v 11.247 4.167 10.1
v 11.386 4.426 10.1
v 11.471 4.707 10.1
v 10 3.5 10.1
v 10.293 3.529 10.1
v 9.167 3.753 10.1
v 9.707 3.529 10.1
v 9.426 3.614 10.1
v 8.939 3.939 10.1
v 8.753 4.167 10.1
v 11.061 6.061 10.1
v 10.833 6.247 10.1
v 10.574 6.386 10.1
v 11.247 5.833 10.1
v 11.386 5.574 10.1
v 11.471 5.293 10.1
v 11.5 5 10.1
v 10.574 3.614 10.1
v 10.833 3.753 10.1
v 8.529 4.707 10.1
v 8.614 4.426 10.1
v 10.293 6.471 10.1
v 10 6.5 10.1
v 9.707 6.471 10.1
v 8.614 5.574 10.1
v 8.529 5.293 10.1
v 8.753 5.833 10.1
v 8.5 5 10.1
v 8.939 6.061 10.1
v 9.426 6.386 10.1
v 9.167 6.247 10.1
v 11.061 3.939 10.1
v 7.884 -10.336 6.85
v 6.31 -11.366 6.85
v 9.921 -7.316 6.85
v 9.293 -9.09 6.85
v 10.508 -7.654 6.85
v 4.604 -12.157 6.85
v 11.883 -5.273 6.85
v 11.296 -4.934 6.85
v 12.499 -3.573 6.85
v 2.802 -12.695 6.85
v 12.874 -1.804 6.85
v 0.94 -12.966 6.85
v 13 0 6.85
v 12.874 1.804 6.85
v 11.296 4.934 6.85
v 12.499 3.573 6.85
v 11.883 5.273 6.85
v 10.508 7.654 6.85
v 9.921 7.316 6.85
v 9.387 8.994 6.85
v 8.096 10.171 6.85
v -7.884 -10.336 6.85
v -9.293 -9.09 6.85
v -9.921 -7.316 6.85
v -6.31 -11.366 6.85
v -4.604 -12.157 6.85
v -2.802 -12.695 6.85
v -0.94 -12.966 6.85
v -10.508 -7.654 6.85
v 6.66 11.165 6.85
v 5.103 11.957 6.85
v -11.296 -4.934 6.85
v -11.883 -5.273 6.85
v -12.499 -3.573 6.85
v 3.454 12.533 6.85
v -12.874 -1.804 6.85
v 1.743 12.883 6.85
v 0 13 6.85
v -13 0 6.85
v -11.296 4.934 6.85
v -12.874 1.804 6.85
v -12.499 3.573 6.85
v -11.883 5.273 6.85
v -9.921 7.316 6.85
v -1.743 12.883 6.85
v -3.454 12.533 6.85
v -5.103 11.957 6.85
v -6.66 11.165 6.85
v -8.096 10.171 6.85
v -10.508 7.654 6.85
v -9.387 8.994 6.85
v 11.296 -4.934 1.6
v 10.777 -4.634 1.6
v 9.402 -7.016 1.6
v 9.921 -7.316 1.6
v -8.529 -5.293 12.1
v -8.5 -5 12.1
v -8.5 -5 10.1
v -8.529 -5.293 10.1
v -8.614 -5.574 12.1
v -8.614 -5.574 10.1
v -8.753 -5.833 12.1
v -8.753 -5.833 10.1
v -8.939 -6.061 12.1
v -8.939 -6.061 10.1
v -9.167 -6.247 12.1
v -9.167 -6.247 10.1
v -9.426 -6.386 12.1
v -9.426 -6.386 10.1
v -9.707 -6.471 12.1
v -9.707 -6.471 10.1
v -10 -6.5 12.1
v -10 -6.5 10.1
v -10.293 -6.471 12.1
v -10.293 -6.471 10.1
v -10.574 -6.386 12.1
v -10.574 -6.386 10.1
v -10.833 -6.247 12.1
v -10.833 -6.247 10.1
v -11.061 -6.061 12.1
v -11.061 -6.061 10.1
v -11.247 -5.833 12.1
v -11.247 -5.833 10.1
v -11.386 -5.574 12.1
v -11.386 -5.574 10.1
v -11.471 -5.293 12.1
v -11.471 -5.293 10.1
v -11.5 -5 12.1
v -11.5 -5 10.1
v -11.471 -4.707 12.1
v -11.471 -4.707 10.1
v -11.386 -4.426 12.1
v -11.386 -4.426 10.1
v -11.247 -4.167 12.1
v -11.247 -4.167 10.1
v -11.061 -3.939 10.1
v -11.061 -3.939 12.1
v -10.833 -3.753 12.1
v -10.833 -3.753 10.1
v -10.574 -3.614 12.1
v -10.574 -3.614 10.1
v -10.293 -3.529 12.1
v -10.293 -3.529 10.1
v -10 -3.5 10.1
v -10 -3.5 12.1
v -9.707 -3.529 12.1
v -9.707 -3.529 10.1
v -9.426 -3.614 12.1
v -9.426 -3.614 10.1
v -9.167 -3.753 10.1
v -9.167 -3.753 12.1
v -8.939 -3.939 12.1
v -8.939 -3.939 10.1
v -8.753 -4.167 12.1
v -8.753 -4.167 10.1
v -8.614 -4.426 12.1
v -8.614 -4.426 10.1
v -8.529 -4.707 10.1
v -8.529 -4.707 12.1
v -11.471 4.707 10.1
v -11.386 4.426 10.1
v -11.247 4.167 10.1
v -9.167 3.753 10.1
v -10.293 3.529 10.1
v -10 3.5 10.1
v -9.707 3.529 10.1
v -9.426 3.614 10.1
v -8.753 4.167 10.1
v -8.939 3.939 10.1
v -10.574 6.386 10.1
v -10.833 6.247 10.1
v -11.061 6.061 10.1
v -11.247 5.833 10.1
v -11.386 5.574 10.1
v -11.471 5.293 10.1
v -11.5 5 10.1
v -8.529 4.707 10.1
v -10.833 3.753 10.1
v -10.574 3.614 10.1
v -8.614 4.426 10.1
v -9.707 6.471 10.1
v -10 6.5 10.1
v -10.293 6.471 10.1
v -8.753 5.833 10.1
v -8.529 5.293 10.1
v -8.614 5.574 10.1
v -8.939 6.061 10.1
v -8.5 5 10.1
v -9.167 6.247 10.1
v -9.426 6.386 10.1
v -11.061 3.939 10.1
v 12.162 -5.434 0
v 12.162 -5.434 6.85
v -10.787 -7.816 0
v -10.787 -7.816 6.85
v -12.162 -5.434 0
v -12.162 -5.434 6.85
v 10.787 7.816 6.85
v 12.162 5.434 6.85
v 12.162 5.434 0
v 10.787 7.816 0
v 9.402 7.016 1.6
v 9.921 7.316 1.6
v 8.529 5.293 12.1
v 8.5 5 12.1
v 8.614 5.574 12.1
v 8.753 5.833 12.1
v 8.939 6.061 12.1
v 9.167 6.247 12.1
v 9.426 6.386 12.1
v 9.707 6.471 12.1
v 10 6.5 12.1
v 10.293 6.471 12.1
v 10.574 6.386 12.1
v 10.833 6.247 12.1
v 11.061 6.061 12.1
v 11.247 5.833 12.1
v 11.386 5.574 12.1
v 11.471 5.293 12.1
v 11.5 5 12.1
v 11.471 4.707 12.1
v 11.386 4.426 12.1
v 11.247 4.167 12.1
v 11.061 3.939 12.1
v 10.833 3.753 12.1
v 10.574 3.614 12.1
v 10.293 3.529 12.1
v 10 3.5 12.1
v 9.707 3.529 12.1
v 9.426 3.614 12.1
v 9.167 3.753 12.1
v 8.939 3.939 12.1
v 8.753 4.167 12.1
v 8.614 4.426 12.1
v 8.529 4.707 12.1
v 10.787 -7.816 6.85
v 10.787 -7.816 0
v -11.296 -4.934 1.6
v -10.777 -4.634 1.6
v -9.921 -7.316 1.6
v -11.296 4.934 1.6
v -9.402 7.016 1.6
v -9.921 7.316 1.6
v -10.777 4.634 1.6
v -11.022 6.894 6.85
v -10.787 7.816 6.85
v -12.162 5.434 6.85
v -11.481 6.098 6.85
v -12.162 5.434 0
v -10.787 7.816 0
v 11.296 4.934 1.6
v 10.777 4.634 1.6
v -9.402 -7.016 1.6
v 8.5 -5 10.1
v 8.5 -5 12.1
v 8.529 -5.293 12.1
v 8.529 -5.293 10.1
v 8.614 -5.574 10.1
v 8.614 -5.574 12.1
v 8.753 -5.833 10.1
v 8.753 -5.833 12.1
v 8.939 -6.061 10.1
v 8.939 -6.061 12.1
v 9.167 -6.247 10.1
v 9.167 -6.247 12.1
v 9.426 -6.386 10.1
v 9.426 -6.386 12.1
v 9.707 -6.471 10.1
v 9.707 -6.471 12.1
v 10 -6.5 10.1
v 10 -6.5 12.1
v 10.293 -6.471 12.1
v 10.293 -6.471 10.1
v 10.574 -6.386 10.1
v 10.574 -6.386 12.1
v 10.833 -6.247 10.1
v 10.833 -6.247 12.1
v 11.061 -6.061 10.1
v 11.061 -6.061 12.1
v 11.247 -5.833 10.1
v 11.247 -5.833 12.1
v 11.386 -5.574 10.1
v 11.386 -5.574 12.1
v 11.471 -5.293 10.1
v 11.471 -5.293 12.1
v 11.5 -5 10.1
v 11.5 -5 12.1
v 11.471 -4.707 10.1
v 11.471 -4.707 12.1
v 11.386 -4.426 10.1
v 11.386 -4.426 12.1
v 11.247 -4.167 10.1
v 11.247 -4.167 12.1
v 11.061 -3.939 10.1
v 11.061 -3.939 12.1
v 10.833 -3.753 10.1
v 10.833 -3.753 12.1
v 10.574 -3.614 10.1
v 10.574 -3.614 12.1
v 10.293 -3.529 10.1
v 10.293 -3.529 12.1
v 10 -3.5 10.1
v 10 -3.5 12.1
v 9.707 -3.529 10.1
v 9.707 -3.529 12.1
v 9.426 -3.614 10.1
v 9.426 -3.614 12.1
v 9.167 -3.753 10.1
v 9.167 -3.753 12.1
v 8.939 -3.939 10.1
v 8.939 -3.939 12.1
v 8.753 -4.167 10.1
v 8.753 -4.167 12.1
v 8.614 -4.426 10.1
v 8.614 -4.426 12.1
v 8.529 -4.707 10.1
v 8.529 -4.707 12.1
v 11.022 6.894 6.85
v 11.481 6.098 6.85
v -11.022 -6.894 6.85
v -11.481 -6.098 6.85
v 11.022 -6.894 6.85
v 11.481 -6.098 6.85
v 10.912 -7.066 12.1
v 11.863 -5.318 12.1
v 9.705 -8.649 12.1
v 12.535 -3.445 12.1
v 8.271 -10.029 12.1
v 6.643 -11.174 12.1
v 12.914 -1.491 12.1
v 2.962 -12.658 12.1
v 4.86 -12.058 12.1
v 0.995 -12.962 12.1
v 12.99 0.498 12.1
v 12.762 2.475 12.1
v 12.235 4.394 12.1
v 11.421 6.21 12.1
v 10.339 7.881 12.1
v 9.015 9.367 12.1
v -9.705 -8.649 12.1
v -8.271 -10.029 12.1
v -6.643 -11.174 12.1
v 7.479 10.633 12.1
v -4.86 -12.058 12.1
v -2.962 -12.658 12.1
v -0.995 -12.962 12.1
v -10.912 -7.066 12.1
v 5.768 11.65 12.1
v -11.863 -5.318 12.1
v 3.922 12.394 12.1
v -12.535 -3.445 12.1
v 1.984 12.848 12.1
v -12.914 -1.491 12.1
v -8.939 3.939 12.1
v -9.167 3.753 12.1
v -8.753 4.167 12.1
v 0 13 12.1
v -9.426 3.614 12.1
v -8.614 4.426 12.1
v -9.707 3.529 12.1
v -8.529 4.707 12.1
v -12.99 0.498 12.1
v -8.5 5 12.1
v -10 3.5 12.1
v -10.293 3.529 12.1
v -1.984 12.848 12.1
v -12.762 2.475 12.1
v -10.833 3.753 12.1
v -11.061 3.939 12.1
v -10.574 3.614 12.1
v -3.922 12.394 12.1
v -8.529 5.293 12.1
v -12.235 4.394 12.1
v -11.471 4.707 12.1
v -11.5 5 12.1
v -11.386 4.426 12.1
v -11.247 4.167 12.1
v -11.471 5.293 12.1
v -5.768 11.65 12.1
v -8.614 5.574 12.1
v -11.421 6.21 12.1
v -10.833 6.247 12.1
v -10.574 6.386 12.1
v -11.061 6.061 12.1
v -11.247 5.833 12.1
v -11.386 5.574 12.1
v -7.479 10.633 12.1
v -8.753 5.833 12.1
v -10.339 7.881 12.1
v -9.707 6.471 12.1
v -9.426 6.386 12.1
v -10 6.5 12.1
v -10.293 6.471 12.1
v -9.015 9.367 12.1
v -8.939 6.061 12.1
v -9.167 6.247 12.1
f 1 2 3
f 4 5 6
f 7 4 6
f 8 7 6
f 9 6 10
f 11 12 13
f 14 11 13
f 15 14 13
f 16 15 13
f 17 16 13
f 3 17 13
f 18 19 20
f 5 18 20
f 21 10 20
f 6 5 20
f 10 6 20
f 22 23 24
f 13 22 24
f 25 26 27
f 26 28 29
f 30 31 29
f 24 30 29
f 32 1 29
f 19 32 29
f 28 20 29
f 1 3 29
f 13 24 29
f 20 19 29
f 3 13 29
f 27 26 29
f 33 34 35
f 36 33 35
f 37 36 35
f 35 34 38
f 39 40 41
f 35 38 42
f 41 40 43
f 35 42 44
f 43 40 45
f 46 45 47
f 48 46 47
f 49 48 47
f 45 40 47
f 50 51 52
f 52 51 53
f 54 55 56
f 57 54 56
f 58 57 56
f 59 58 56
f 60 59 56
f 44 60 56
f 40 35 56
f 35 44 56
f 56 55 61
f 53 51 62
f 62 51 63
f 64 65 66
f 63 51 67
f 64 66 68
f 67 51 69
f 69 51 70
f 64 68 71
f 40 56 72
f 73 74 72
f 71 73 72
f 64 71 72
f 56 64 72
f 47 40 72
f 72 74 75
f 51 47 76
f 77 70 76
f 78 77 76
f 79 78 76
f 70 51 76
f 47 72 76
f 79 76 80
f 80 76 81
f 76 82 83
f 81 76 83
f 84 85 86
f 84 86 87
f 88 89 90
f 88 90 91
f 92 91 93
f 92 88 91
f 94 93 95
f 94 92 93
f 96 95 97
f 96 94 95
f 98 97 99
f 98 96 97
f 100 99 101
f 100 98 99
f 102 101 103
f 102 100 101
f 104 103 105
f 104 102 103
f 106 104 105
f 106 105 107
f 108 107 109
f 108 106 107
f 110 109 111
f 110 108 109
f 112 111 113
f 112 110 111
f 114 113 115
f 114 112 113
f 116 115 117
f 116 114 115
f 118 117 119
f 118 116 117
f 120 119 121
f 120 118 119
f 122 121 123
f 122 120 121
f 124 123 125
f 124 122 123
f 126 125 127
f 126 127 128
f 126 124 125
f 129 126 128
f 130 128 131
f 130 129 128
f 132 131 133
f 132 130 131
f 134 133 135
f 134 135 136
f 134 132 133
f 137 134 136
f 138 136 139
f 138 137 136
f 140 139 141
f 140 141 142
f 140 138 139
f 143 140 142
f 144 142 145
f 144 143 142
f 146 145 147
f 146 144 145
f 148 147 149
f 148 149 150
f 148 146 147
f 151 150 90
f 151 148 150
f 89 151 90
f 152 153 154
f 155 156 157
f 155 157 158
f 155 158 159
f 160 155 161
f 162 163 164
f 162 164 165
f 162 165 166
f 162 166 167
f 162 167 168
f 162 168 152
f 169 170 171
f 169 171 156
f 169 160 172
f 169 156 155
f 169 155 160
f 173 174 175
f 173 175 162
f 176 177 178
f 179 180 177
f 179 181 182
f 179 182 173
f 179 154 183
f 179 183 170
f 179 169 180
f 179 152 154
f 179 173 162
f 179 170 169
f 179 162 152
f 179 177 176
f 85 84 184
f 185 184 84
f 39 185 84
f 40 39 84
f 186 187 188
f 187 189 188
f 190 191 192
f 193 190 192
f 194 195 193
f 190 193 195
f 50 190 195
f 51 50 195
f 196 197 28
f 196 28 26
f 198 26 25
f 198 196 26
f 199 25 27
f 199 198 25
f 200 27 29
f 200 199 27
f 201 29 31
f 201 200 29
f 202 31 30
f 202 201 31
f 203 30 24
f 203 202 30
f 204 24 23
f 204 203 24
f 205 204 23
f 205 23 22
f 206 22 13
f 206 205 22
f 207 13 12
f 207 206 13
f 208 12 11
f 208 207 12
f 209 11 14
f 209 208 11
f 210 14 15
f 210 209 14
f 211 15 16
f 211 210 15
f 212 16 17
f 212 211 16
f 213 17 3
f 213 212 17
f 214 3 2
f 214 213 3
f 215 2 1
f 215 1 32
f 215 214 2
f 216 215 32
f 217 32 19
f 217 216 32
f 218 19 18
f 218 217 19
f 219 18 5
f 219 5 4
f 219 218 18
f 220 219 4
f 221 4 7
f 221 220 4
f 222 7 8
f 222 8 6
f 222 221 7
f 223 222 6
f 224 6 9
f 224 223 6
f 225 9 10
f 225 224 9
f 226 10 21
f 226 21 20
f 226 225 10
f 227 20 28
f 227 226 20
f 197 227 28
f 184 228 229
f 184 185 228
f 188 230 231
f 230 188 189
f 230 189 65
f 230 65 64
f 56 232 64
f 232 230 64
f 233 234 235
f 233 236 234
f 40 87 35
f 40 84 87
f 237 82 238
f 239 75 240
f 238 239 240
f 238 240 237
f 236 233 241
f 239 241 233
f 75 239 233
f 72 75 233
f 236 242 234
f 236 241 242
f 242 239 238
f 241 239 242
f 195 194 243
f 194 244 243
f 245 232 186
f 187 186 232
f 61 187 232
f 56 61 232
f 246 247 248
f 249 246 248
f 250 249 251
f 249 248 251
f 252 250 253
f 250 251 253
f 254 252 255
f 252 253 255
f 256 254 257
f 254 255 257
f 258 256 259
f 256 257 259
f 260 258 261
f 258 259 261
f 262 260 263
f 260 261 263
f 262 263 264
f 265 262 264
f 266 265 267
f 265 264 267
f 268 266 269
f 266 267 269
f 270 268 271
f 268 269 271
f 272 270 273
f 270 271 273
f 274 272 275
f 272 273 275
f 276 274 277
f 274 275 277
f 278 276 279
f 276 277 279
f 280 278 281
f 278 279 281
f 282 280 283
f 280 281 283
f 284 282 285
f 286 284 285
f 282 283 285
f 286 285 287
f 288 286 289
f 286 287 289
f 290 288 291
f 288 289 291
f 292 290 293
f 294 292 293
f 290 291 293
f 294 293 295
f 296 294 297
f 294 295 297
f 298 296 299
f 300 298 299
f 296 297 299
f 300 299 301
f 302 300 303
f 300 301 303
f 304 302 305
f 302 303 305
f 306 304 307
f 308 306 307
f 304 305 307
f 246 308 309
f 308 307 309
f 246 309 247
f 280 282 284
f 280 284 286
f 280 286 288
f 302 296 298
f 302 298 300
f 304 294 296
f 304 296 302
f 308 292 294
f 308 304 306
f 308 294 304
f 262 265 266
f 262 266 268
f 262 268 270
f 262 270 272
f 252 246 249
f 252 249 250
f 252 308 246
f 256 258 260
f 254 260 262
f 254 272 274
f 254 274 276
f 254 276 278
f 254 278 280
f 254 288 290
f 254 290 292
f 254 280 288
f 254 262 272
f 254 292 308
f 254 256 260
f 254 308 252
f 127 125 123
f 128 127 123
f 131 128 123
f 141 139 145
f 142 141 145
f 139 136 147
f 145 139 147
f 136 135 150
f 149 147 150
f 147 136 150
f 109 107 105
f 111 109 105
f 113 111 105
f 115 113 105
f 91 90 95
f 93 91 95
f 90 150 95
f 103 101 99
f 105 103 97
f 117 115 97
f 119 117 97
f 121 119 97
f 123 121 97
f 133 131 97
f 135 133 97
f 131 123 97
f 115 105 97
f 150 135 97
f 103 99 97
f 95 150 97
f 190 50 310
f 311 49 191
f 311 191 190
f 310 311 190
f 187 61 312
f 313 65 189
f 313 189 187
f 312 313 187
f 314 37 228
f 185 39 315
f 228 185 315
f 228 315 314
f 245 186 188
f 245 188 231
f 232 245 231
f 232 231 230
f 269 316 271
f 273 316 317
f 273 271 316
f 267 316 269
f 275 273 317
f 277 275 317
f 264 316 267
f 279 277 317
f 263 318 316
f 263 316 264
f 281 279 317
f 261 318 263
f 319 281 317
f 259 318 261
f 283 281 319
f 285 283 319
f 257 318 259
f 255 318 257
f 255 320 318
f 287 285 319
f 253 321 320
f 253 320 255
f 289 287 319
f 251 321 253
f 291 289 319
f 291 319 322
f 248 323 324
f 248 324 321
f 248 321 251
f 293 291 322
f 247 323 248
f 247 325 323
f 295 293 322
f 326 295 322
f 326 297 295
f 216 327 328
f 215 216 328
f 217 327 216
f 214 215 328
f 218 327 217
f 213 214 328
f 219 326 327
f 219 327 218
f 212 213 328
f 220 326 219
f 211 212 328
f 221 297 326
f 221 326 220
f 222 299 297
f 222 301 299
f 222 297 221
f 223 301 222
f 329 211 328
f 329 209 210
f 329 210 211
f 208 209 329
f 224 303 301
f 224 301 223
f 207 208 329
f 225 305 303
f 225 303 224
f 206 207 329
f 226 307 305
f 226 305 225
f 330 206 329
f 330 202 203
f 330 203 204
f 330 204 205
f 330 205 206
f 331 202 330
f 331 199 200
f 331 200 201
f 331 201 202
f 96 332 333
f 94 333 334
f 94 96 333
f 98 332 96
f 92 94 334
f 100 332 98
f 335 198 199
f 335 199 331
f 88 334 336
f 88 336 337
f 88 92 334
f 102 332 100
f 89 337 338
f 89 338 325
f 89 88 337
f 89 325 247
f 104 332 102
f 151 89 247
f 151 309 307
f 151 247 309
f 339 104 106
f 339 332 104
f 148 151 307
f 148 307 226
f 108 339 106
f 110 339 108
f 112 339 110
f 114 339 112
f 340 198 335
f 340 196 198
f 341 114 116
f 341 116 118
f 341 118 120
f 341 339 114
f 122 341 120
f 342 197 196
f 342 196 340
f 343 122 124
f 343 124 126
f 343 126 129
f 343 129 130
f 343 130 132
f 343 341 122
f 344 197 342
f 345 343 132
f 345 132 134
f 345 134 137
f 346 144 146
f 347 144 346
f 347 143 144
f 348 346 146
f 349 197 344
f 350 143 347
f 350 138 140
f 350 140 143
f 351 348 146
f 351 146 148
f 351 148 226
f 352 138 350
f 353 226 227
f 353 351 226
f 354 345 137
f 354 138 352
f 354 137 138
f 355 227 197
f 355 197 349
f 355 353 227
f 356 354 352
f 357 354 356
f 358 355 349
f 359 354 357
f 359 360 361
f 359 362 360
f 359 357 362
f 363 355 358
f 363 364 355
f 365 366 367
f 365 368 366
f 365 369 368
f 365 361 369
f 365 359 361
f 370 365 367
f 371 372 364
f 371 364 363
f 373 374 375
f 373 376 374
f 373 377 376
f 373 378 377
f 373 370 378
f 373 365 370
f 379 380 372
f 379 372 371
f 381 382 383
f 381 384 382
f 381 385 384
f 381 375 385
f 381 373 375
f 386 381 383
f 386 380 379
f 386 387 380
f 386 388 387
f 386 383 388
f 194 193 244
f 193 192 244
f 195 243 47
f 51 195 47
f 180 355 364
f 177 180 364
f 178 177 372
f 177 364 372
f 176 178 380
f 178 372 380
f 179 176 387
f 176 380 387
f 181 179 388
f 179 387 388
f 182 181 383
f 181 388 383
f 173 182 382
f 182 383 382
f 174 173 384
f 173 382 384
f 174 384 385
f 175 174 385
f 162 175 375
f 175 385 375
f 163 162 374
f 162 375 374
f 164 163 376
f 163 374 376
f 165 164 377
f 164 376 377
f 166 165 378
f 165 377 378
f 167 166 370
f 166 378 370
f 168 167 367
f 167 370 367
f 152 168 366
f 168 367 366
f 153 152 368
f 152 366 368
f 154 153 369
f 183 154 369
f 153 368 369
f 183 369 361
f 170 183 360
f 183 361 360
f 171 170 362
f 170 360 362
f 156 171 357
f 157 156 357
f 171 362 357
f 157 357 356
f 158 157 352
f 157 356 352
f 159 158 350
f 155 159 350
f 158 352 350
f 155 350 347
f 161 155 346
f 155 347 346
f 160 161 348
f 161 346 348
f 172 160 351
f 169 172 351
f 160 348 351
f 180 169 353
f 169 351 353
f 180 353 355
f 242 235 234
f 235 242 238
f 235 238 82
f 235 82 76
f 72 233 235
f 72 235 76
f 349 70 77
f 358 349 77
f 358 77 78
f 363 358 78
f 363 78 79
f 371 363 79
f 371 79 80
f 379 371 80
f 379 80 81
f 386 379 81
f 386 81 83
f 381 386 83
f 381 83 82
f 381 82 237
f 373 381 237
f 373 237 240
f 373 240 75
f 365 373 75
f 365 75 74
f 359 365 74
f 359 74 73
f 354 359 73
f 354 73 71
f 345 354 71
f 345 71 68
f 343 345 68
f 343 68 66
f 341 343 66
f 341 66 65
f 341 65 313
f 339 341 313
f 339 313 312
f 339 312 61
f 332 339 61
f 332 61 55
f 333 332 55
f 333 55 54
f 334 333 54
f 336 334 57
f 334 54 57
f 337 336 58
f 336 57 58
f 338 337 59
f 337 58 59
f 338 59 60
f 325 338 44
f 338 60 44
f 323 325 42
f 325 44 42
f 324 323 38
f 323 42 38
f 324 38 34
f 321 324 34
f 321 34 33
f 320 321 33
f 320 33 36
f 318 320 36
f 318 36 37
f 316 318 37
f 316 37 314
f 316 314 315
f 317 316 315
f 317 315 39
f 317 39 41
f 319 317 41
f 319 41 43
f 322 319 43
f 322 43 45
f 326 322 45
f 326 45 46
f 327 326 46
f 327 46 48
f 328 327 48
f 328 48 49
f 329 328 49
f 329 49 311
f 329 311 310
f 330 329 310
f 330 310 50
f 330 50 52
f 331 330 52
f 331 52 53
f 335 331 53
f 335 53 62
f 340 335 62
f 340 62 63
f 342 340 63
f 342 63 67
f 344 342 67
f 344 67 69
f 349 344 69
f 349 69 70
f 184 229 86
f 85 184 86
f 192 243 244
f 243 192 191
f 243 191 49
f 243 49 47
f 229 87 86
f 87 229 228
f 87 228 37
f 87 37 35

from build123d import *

# Parameters (mm, degrees)
SKETCH002_R                = 13
PAD001_DEPTH               = 5.25
SKETCH012_R                = 1.5
POCKET003_DEPTH            = 2
SKETCH012_MIRRORED_2_R     = 1.5
POCKET003_MIRRORED_2_DEPTH = 2
PAD007_DEPTH               = 1.375
PAD007_MIRRORED002_2_DEPTH = 1.375


with BuildPart() as part:
    # Sketch002 → Pad001 (new body)
    with BuildSketch(Plane(origin=(0, 0, 6.85), x_dir=(0, 1, 0), z_dir=(0, 0, 1))):
        Circle(SKETCH002_R)
    extrude(amount=PAD001_DEPTH)

    # Sketch012 (on Face3 of Pad001) → Pocket003 (cut)
    with BuildSketch(Plane(origin=(-10, 5, 12.1), x_dir=(1, 0, 0), z_dir=(0, 0, 1))):
        Circle(SKETCH012_R)
    pocket003 = extrude(amount=-POCKET003_DEPTH, mode=Mode.SUBTRACT)

    # Sketch012 Mirrored 2 → Pocket003 Mirrored 2 (cut)
    with BuildSketch(Plane(origin=(10, 5, 12.1), x_dir=(-1, 0, 0), z_dir=(0, 0, -1))):
        Circle(SKETCH012_MIRRORED_2_R)
    pocket003_mirrored_2 = extrude(amount=POCKET003_MIRRORED_2_DEPTH, mode=Mode.SUBTRACT)

    # Mirrored001: Pocket003, Pocket003 Mirrored 2 across XZ
    add(pocket003.mirror(Plane.XZ), mode=Mode.SUBTRACT)
    add(pocket003_mirrored_2.mirror(Plane.XZ), mode=Mode.SUBTRACT)

    # Sketch013 → Pad007 (join, symmetric)
    with BuildSketch(Plane(origin=(0, 0, 0), x_dir=(0.866025, 0.5, 0), z_dir=(0.5, -0.866025, 0))):
        Polygon((13.25, 6.85), (13.25, 0), (11.65, 1.6), (12.25, 1.6), (12.25, 6.85), align=None)
    pad007 = extrude(amount=PAD007_DEPTH, both=True)

    # Sketch013 Mirrored002 2 → Pad007 Mirrored002 2 (add, symmetric)
    with BuildSketch(Plane(origin=(0, 0, 0), x_dir=(0.866025, -0.5, 0), z_dir=(-0.5, -0.866025, 0))):
        Polygon((13.25, 6.85), (13.25, 0), (11.65, 1.6), (12.25, 1.6), (12.25, 6.85), align=None)
    pad007_mirrored002_2 = extrude(amount=-PAD007_MIRRORED002_2_DEPTH, both=True)

    # Mirrored003: Pad007, Pad007 Mirrored002 2 across YZ
    add(pad007.mirror(Plane.YZ))
    add(pad007_mirrored002_2.mirror(Plane.YZ))


solid = part.part
